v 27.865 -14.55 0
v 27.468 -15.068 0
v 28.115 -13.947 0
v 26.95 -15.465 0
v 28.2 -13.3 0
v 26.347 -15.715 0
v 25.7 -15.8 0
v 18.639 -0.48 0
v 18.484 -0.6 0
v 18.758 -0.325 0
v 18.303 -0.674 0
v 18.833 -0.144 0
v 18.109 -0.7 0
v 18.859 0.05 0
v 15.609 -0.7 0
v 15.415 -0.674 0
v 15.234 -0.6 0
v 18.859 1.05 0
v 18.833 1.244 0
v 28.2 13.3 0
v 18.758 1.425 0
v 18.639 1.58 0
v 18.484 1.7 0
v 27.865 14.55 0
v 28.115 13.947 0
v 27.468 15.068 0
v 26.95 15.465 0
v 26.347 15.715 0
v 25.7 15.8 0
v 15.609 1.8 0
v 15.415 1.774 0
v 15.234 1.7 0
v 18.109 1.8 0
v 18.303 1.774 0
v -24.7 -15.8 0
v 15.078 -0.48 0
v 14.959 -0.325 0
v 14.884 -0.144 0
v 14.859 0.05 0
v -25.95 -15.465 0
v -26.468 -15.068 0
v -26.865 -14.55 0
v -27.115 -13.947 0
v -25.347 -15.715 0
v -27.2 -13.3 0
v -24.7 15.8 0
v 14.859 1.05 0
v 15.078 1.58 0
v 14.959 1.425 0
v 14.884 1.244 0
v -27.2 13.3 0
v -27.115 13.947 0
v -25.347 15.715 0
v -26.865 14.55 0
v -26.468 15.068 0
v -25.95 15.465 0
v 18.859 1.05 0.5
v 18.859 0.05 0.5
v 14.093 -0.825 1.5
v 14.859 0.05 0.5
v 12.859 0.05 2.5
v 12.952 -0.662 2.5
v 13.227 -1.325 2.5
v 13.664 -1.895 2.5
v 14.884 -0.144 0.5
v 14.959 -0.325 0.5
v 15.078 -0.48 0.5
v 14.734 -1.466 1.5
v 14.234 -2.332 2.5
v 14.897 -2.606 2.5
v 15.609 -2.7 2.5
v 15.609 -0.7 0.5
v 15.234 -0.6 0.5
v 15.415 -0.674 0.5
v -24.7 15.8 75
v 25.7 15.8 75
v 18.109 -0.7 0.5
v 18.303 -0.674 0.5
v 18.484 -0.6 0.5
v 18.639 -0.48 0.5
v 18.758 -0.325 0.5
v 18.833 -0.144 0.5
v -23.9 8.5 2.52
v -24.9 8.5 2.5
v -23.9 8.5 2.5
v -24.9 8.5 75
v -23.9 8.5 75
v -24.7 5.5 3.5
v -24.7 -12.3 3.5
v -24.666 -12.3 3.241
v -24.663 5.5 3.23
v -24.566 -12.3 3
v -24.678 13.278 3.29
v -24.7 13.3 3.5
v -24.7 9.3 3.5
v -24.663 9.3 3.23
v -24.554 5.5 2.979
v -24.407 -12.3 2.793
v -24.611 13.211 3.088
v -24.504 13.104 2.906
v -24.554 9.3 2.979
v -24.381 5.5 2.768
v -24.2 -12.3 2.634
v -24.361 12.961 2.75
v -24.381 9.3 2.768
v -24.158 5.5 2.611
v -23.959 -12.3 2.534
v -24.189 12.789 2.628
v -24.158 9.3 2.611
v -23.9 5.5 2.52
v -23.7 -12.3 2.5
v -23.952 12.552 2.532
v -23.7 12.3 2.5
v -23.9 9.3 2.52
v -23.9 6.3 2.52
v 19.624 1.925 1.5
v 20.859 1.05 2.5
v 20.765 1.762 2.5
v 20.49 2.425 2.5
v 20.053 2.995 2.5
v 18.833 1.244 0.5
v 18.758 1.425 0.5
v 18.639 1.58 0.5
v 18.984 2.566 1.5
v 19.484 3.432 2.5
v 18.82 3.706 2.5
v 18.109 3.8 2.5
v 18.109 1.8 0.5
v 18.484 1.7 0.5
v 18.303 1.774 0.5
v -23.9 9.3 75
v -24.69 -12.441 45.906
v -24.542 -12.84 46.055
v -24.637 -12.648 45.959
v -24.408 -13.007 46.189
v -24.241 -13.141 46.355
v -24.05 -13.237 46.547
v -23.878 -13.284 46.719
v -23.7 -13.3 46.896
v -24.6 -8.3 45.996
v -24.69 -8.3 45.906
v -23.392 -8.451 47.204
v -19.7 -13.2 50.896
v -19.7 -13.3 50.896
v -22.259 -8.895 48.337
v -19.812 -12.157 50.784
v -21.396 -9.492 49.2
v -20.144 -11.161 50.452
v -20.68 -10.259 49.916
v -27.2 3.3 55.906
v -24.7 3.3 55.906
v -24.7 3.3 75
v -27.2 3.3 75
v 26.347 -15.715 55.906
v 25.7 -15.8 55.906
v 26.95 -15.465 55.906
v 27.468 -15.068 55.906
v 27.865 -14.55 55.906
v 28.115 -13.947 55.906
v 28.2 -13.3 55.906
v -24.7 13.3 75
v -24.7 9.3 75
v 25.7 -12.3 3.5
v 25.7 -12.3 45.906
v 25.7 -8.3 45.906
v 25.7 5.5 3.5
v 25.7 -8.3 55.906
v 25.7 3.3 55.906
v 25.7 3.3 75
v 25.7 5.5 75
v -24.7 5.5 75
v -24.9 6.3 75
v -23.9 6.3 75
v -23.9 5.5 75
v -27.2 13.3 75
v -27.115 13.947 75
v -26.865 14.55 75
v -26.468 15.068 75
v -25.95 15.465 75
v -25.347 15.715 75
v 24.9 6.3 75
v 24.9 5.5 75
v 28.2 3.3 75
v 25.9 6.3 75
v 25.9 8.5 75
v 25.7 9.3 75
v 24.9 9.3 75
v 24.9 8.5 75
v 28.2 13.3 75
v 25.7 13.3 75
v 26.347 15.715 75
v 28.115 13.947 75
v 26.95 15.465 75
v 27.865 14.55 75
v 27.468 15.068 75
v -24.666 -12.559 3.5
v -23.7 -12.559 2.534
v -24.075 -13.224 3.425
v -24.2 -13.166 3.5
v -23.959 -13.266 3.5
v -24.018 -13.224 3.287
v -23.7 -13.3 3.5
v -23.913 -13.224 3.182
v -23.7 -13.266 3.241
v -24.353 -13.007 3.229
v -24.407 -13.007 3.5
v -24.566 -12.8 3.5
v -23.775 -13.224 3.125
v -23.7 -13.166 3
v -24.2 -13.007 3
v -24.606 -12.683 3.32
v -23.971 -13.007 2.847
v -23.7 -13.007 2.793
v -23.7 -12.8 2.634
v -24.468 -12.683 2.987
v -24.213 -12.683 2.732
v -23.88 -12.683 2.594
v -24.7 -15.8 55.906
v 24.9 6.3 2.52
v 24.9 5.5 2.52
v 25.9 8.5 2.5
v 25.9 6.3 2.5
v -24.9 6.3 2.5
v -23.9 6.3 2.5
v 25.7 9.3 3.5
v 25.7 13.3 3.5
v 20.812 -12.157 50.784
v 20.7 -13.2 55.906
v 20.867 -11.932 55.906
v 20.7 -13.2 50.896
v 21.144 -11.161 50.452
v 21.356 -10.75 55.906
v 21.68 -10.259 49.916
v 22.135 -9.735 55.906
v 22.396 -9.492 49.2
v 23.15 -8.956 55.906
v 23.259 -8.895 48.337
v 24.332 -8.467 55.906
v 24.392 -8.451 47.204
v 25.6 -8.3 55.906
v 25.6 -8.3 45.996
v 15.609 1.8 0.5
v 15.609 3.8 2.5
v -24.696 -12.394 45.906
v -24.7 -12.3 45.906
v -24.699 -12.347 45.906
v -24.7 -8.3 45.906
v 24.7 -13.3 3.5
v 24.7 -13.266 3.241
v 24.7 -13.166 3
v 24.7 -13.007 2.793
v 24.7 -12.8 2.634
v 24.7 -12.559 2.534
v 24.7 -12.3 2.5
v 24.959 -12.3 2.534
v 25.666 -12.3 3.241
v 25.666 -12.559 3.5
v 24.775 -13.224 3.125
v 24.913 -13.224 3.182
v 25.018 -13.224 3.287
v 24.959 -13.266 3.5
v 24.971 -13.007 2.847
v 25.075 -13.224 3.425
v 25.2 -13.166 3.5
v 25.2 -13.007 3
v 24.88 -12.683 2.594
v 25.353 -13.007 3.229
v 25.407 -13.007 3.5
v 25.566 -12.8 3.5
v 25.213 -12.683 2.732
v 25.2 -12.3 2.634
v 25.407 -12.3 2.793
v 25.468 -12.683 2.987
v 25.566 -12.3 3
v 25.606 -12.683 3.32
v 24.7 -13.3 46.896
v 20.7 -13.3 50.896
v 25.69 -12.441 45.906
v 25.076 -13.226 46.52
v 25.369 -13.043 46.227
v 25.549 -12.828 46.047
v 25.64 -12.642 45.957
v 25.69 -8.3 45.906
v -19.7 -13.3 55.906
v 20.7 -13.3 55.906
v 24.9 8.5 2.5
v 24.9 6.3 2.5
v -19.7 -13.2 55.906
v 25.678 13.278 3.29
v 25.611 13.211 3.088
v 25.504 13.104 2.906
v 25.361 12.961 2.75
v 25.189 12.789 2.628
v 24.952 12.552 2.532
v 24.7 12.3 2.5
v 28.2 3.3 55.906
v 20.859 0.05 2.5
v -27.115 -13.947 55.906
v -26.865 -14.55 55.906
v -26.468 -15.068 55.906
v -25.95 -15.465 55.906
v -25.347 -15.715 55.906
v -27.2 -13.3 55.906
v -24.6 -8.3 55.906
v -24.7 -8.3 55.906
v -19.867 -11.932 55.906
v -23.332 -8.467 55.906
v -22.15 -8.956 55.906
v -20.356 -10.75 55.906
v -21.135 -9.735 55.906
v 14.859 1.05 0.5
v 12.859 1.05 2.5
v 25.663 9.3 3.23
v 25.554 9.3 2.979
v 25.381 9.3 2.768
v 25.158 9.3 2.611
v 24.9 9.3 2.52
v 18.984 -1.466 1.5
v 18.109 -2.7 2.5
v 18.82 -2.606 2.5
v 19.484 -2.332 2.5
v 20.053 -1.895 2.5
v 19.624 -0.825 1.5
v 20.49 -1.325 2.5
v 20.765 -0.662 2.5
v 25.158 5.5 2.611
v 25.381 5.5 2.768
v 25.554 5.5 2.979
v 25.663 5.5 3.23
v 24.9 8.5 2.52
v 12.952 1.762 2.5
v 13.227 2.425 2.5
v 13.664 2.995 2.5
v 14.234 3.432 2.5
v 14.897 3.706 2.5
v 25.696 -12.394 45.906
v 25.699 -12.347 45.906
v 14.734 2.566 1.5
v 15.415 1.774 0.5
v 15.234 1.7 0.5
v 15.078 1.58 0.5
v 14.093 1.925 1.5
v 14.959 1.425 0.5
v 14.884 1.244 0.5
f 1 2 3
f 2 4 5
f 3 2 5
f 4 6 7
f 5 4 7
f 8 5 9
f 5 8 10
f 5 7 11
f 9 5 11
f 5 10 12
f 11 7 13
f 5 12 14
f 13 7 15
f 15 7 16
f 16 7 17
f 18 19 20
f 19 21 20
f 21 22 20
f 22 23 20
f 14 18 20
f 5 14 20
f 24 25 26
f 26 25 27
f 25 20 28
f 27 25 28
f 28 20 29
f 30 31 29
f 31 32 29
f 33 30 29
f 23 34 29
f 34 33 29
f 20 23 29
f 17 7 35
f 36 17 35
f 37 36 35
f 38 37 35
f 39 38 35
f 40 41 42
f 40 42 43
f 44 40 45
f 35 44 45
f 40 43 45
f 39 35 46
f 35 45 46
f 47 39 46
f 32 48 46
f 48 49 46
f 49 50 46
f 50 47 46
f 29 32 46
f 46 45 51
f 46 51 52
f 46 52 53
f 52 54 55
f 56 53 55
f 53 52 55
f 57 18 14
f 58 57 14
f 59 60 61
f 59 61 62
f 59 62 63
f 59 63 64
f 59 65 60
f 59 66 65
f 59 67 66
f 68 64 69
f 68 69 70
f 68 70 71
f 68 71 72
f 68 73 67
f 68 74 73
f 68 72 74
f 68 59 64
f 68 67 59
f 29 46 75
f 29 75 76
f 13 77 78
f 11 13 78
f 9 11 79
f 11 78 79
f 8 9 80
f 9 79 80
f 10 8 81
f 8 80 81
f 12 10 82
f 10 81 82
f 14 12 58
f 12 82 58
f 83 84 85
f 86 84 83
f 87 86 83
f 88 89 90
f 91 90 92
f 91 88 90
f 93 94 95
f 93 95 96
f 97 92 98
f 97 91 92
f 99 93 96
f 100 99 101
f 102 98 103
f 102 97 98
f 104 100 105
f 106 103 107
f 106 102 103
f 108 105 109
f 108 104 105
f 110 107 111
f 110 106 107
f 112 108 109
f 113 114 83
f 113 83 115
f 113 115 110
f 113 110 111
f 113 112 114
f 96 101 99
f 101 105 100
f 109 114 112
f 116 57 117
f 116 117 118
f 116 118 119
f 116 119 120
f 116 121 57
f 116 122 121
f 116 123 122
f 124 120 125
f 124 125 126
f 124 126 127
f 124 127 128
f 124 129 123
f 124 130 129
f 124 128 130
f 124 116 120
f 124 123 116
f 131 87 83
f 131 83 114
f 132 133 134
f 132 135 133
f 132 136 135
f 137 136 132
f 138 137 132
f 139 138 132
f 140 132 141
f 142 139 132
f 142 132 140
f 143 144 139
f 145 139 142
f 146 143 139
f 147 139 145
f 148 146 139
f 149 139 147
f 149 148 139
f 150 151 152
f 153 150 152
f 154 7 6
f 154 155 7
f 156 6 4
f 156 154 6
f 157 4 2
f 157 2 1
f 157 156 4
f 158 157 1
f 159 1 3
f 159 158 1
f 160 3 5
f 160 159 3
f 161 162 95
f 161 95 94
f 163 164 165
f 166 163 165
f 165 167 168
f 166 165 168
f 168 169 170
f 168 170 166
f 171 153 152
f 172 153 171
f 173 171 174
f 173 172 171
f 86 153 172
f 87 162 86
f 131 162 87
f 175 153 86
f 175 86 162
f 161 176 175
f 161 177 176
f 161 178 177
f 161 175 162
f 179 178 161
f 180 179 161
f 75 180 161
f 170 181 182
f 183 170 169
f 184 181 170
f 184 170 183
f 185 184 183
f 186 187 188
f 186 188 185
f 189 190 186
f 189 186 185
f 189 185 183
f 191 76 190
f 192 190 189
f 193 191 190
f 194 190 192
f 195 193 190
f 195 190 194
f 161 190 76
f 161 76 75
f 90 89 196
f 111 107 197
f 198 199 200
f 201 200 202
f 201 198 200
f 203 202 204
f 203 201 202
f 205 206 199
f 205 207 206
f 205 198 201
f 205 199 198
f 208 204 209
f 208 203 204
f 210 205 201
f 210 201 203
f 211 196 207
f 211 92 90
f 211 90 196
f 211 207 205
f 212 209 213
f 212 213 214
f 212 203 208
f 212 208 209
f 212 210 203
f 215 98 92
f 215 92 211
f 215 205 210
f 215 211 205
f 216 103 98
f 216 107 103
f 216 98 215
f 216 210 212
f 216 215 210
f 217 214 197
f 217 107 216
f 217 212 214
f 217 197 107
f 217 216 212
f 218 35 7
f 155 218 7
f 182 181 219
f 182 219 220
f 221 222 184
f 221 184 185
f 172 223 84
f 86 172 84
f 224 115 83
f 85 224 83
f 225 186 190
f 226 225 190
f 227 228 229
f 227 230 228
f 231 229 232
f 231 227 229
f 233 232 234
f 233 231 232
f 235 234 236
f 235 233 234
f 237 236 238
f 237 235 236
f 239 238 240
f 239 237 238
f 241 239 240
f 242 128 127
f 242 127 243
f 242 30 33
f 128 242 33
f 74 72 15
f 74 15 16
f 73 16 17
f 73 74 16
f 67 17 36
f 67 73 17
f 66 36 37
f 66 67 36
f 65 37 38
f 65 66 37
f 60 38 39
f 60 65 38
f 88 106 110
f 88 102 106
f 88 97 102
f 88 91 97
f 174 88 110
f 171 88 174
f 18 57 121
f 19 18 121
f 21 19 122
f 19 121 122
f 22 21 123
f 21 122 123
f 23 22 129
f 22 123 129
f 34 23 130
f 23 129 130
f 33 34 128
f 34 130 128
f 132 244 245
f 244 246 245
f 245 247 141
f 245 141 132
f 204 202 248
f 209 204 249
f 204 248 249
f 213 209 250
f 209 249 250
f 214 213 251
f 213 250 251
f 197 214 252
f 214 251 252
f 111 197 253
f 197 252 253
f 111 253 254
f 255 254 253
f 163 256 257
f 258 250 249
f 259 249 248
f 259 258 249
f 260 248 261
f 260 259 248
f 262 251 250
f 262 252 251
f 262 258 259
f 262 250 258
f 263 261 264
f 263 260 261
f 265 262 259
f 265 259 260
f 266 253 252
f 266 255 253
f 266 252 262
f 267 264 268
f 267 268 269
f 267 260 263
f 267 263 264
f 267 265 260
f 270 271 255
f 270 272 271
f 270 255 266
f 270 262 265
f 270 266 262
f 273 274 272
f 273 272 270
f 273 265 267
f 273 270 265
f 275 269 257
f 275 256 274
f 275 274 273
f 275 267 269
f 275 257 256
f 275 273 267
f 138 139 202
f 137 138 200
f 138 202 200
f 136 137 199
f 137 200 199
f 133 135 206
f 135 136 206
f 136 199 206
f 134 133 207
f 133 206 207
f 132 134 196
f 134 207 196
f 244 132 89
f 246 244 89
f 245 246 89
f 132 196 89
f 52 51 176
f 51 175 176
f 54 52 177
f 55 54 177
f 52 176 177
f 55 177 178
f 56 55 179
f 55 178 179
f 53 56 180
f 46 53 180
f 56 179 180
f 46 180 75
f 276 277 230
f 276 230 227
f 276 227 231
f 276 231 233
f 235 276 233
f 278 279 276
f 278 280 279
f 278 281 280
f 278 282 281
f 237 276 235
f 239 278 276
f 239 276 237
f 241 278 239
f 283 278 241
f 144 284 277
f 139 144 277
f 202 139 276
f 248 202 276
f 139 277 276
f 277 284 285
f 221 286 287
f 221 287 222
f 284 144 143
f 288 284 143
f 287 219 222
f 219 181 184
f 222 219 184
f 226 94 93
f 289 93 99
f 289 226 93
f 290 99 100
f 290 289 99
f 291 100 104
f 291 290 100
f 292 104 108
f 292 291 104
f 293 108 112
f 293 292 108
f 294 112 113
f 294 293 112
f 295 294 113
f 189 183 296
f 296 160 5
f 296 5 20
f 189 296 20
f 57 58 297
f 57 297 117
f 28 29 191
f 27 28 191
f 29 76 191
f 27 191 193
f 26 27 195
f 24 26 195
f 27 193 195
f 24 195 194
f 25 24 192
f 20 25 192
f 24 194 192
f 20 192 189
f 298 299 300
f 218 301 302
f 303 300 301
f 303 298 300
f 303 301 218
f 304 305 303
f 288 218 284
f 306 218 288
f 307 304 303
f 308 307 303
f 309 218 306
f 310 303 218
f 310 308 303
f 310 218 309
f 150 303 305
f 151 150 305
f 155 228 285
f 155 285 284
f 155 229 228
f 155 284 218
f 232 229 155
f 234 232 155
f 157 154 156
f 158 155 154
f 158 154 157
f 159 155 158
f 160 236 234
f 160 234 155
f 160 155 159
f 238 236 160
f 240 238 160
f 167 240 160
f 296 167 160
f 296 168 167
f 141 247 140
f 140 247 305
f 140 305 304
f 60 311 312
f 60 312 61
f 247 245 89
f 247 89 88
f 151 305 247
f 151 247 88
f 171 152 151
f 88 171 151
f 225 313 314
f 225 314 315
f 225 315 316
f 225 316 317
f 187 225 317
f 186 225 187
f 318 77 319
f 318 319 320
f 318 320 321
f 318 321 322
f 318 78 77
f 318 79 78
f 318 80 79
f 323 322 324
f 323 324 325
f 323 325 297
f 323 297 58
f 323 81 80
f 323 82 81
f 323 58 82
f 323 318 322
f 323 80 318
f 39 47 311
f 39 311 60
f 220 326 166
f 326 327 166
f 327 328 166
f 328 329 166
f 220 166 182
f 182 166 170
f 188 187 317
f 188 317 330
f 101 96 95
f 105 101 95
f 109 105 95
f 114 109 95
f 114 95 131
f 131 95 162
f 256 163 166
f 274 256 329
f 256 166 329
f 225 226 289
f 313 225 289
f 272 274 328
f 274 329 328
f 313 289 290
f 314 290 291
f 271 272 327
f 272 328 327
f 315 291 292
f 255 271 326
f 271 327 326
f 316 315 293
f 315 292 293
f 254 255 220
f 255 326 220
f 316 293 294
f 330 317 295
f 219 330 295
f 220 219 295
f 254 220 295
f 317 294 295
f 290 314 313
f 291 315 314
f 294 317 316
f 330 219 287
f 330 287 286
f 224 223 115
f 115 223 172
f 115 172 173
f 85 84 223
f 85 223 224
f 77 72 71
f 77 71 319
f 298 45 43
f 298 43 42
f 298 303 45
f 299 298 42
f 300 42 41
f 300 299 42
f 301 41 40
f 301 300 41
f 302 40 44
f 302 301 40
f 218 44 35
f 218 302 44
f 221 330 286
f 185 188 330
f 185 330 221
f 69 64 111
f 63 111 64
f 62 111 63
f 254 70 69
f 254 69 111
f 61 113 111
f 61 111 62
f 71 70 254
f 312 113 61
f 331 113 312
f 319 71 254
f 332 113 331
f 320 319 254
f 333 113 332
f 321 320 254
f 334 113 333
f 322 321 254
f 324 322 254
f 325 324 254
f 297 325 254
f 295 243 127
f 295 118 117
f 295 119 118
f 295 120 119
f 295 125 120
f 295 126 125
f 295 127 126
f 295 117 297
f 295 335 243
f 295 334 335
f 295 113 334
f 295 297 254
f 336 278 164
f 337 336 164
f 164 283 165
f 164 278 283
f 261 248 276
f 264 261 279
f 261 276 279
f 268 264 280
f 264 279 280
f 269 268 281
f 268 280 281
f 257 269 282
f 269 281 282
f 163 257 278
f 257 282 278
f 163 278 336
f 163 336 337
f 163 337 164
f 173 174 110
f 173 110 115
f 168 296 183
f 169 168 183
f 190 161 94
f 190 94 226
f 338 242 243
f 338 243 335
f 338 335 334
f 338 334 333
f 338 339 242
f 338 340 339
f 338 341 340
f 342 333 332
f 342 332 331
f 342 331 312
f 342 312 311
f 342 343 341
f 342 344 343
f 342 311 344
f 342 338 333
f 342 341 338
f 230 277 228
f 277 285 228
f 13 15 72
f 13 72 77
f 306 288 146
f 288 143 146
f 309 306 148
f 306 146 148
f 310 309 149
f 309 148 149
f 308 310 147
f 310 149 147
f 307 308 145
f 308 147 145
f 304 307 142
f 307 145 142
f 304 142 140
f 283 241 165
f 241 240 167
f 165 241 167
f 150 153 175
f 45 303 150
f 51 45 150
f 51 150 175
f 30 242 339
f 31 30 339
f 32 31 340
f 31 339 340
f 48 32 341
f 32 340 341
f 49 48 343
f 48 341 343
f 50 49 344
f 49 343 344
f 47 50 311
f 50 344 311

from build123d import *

# Parameters (mm, degrees)
SKETCH_W        = 55.4
SKETCH_H        = 31.6
PAD_DEPTH       = 75
SKETCH001_W     = 50.4
SKETCH001_H     = 26.6
POCKET_DEPTH    = 72.5
SKETCH002_W     = 1
SKETCH002_H     = 75
PAD001_DEPTH    = 0.8
SKETCH003_W     = 1
SKETCH003_H     = 72.5
PAD002_DEPTH    = 0.8
SKETCH004_W     = 19.1
SKETCH004_H     = 19.09362
POCKET001_DEPTH = 56
FILLET_R        = 1
FILLET001_R     = 1
SKETCH005_W     = 4
SKETCH005_H     = 2.5
POCKET002_DEPTH = 4
FILLET002_R     = 0.75
CHAMFER_SIZE    = 2
FILLET003_R     = 2.5
SKETCH006_W     = 1
SKETCH006_H     = 2.2
POCKET003_DEPTH = 72.5
SKETCH007_W     = 5
SKETCH007_H     = 5
PAD003_DEPTH    = 10
CHAMFER001_SIZE = 4.99
FILLET004_R     = 4.9


with BuildPart() as part:
    # Sketch → Pad (new body)
    with BuildSketch(Plane.XY):
        with Locations((0.5, 0)):
            Rectangle(SKETCH_W, SKETCH_H)
    extrude(amount=PAD_DEPTH)

    # Sketch001 (on Face6 of Pad) → Pocket (cut)
    with BuildSketch(Plane.XY.offset(75)):
        with Locations((0.5, 0)):
            Rectangle(SKETCH001_W, SKETCH001_H)
    extrude(amount=-POCKET_DEPTH, mode=Mode.SUBTRACT)

    # Sketch002 (on Face10 of Pocket) → Pad001 (join)
    with BuildSketch(Plane.YZ.offset(-24.7)):
        with Locations((8.8, 37.5)):
            Rectangle(SKETCH002_W, SKETCH002_H)
        with Locations((6, 37.5)):
            Rectangle(SKETCH002_W, SKETCH002_H)
    extrude(amount=PAD001_DEPTH)

    # Sketch003 (on Face10 of Pad001) → Pad002 (join)
    with BuildSketch(Plane(origin=(25.7, 0, 0), x_dir=(0, -1, 0), z_dir=(-1, 0, 0))):
        with Locations((-8.8, 38.75)):
            Rectangle(SKETCH003_W, SKETCH003_H)
        with Locations((-6, 38.75)):
            Rectangle(SKETCH003_W, SKETCH003_H)
    extrude(amount=PAD002_DEPTH)

    # Sketch004 (on Face3 of Pad002) → Pocket001 (cut)
    with BuildSketch(Plane.YZ.offset(28.2)):
        with Locations((-6.25, 65.45319)):
            Rectangle(SKETCH004_W, SKETCH004_H)
    extrude(amount=-POCKET001_DEPTH, mode=Mode.SUBTRACT)

    # Fillet
    fillet_edges = [part.edges().sort_by_distance(p)[0] for p in [
        (25.7, 11.3, 2.5),
        (0.5, 13.3, 2.5),
        (-24.7, 11.3, 2.5),
    ]]
    fillet(fillet_edges, radius=FILLET_R)

    # Fillet001
    fillet001_edges = [part.edges().sort_by_distance(p)[0] for p in [
        (0.5, -13.3, 2.5),
    ]]
    fillet(fillet001_edges, radius=FILLET001_R)

    # Sketch005 (on Face37 of Fillet001) → Pocket002 (cut)
    with BuildSketch(Plane(origin=(0, 0, 0), x_dir=(1, 0, 0), z_dir=(0, 0, -1))):
        with Locations((16.858666, -0.55)):
            Rectangle(SKETCH005_W, SKETCH005_H)
    extrude(amount=-POCKET002_DEPTH, mode=Mode.SUBTRACT)

    # Fillet002
    fillet002_edges = [part.edges().sort_by_distance(p)[0] for p in [
        (18.858666, 1.8, 1.25),
        (18.858666, -0.7, 1.25),
        (14.858666, -0.7, 1.25),
        (14.858666, 1.8, 1.25),
    ]]
    fillet(fillet002_edges, radius=FILLET002_R)

    # Chamfer
    chamfer_edges = [part.edges().sort_by_distance(p)[0] for p in [
        (16.858666, 1.8, 2.5),
    ]]
    chamfer(chamfer_edges, length=CHAMFER_SIZE)

    # Fillet003
    fillet003_edges = [part.edges().sort_by_distance(p)[0] for p in [
        (-27.2, -15.8, 27.95319),
        (-27.2, 15.8, 37.5),
        (28.2, -15.8, 27.95319),
        (28.2, 15.8, 37.5),
    ]]
    fillet(fillet003_edges, radius=FILLET003_R)

    # Sketch006 (on Face20 of Fillet003) → Pocket003 (cut)
    with BuildSketch(Plane.XY.offset(75)):
        with Locations((-24.4, 7.4)):
            Rectangle(SKETCH006_W, SKETCH006_H)
        with Locations((25.4, 7.4)):
            Rectangle(SKETCH006_W, SKETCH006_H)
    extrude(amount=-POCKET003_DEPTH, mode=Mode.SUBTRACT)

    # Sketch007 (on Face21 of Pocket003) → Pad003 (join)
    with BuildSketch(Plane.XY.offset(55.90638)):
        with Locations((23.2, -10.8)):
            Rectangle(SKETCH007_W, SKETCH007_H)
        with Locations((-22.2, -10.8)):
            Rectangle(SKETCH007_W, SKETCH007_H)
    extrude(amount=-PAD003_DEPTH)

    # Chamfer001
    chamfer001_edges = [part.edges().sort_by_distance(p)[0] for p in [
        (20.7, -10.8, 45.90638),
        (-19.7, -10.8, 45.90638),
    ]]
    chamfer(chamfer001_edges, length=CHAMFER001_SIZE)

    # Fillet004
    fillet004_edges = [part.edges().sort_by_distance(p)[0] for p in [
        (-19.7, -8.3, 53.40138),
        (20.7, -8.3, 53.40138),
    ]]
    fillet(fillet004_edges, radius=FILLET004_R)


solid = part.part
